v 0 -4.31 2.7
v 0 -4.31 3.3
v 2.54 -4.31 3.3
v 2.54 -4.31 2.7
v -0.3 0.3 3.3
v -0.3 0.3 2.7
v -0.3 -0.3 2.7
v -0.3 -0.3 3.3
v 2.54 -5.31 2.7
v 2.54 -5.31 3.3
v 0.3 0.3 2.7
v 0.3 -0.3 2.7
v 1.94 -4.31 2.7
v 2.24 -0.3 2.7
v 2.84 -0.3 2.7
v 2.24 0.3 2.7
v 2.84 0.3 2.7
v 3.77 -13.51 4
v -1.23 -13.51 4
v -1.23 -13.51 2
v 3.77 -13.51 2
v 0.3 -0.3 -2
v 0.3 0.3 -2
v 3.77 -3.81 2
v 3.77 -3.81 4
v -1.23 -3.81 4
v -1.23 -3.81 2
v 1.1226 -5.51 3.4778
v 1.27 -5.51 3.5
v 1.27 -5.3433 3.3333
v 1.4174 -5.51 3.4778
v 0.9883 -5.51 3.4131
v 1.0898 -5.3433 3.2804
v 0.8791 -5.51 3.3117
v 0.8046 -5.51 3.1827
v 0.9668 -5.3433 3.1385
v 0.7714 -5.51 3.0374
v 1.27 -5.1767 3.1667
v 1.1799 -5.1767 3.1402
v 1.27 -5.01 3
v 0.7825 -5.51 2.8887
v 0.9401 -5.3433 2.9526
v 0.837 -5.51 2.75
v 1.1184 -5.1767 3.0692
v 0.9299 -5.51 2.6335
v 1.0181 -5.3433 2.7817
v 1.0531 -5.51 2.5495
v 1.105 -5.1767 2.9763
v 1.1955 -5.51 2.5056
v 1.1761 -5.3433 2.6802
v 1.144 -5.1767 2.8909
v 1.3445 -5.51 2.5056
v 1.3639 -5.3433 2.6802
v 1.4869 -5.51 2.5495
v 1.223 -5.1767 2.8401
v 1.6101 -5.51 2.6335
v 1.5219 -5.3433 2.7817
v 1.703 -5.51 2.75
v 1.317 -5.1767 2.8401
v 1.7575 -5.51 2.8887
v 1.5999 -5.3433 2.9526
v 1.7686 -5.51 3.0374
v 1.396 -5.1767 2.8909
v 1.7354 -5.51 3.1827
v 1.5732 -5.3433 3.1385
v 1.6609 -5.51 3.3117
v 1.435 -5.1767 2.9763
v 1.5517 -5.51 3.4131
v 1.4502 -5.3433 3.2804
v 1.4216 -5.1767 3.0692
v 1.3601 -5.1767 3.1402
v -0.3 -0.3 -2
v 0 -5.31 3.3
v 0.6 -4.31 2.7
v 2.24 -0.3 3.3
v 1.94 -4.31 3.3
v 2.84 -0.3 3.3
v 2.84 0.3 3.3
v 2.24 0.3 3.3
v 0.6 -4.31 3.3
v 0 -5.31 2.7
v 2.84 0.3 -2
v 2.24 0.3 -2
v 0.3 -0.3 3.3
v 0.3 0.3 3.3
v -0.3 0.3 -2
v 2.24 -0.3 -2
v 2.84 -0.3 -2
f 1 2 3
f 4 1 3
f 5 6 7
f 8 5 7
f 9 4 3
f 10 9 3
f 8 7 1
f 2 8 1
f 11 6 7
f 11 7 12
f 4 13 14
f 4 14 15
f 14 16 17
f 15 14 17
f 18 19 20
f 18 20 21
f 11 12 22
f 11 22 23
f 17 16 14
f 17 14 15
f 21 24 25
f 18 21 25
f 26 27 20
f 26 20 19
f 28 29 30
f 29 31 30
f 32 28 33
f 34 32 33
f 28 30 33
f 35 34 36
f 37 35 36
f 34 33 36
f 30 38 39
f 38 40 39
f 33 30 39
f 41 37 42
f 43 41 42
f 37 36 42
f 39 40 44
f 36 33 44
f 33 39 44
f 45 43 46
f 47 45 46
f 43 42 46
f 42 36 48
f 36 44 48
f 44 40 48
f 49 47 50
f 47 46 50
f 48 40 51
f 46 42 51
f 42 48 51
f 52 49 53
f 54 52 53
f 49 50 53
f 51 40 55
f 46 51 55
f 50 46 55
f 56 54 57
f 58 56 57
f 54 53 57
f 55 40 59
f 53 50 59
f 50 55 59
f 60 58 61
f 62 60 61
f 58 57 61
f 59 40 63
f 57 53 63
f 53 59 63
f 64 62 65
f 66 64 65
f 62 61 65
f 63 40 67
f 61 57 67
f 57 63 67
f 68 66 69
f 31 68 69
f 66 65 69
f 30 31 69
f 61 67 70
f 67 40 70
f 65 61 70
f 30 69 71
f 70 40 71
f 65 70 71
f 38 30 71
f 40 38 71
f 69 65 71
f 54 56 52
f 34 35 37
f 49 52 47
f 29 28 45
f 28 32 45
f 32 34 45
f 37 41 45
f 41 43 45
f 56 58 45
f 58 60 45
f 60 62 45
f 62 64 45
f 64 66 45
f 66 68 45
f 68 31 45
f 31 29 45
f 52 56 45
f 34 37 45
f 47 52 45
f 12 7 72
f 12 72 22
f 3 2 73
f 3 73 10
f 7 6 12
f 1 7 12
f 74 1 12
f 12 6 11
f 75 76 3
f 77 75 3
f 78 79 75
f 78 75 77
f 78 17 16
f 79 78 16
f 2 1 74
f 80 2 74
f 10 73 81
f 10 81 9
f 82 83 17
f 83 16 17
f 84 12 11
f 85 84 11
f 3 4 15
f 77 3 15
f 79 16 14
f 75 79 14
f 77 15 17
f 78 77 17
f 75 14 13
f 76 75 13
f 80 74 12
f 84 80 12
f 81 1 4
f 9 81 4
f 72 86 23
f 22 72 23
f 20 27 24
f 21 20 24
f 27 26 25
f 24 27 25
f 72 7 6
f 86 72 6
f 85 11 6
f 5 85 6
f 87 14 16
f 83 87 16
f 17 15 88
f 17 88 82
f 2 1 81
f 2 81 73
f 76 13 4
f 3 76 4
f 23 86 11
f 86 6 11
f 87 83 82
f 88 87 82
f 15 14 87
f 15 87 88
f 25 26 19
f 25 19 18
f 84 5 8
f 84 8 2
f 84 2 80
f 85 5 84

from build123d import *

# Parameters (mm, degrees)
SKETCH_W       = 0.6
SKETCH_H       = 0.6
PAD_DEPTH      = 2.7
PAD_DEPTH_BACK = 2
PAD001_DEPTH   = 0.6
SKETCH002_W    = 2.54
SKETCH002_H    = 0.6
PAD002_DEPTH   = 1
SKETCH004_W    = 5
SKETCH004_H    = 2
PAD003_DEPTH   = 9.7


with BuildPart() as pad:
    # Sketch → Pad (new body, two sides)
    with BuildSketch(Plane.XY) as pad_sk:
        Rectangle(SKETCH_W, SKETCH_H)
        with Locations((2.54, 0)):
            Rectangle(SKETCH_W, SKETCH_H)
    extrude(amount=PAD_DEPTH)
    extrude(pad_sk.sketch, amount=-PAD_DEPTH_BACK)


with BuildPart() as pad001:
    # Sketch001 → Pad001 (new body)
    with BuildSketch(Plane.XY.offset(2.7)):
        Polygon((0.3, 0.3), (-0.3, 0.3), (-0.3, -0.3), (0, -4.31), (0.6, -4.31), (0.3, -0.3), align=None)
        Polygon((2.84, 0.3), (2.24, 0.3), (2.24, -0.3), (1.94, -4.31), (2.54, -4.31), (2.84, -0.3), align=None)
    extrude(amount=PAD001_DEPTH)


with BuildPart() as pad002:
    # Sketch002 → Pad002 (new body)
    with BuildSketch(Plane.XZ.offset(4.31)):
        with Locations((1.27, 3)):
            Rectangle(SKETCH002_W, SKETCH002_H)
    extrude(amount=PAD002_DEPTH)


with BuildPart() as pad003:
    # Sketch004 → Pad003 (new body)
    with BuildSketch(Plane.XZ.offset(3.81)):
        with Locations((1.27, 3)):
            Rectangle(SKETCH004_W, SKETCH004_H)
    extrude(amount=PAD003_DEPTH)


with BuildPart() as revolution001:
    # Sketch005 → Revolution001 (revolve)
    with BuildSketch(Plane.YZ.offset(1.27)):
        Polygon((-5.01, 3), (-5.51, 3), (-5.51, 3.5), align=None)
    revolve(axis=Axis((1.27, -3.977201, 3), (0, -1, 0)))


solid = Compound([pad.part, pad001.part, pad002.part, pad003.part, revolution001.part])
